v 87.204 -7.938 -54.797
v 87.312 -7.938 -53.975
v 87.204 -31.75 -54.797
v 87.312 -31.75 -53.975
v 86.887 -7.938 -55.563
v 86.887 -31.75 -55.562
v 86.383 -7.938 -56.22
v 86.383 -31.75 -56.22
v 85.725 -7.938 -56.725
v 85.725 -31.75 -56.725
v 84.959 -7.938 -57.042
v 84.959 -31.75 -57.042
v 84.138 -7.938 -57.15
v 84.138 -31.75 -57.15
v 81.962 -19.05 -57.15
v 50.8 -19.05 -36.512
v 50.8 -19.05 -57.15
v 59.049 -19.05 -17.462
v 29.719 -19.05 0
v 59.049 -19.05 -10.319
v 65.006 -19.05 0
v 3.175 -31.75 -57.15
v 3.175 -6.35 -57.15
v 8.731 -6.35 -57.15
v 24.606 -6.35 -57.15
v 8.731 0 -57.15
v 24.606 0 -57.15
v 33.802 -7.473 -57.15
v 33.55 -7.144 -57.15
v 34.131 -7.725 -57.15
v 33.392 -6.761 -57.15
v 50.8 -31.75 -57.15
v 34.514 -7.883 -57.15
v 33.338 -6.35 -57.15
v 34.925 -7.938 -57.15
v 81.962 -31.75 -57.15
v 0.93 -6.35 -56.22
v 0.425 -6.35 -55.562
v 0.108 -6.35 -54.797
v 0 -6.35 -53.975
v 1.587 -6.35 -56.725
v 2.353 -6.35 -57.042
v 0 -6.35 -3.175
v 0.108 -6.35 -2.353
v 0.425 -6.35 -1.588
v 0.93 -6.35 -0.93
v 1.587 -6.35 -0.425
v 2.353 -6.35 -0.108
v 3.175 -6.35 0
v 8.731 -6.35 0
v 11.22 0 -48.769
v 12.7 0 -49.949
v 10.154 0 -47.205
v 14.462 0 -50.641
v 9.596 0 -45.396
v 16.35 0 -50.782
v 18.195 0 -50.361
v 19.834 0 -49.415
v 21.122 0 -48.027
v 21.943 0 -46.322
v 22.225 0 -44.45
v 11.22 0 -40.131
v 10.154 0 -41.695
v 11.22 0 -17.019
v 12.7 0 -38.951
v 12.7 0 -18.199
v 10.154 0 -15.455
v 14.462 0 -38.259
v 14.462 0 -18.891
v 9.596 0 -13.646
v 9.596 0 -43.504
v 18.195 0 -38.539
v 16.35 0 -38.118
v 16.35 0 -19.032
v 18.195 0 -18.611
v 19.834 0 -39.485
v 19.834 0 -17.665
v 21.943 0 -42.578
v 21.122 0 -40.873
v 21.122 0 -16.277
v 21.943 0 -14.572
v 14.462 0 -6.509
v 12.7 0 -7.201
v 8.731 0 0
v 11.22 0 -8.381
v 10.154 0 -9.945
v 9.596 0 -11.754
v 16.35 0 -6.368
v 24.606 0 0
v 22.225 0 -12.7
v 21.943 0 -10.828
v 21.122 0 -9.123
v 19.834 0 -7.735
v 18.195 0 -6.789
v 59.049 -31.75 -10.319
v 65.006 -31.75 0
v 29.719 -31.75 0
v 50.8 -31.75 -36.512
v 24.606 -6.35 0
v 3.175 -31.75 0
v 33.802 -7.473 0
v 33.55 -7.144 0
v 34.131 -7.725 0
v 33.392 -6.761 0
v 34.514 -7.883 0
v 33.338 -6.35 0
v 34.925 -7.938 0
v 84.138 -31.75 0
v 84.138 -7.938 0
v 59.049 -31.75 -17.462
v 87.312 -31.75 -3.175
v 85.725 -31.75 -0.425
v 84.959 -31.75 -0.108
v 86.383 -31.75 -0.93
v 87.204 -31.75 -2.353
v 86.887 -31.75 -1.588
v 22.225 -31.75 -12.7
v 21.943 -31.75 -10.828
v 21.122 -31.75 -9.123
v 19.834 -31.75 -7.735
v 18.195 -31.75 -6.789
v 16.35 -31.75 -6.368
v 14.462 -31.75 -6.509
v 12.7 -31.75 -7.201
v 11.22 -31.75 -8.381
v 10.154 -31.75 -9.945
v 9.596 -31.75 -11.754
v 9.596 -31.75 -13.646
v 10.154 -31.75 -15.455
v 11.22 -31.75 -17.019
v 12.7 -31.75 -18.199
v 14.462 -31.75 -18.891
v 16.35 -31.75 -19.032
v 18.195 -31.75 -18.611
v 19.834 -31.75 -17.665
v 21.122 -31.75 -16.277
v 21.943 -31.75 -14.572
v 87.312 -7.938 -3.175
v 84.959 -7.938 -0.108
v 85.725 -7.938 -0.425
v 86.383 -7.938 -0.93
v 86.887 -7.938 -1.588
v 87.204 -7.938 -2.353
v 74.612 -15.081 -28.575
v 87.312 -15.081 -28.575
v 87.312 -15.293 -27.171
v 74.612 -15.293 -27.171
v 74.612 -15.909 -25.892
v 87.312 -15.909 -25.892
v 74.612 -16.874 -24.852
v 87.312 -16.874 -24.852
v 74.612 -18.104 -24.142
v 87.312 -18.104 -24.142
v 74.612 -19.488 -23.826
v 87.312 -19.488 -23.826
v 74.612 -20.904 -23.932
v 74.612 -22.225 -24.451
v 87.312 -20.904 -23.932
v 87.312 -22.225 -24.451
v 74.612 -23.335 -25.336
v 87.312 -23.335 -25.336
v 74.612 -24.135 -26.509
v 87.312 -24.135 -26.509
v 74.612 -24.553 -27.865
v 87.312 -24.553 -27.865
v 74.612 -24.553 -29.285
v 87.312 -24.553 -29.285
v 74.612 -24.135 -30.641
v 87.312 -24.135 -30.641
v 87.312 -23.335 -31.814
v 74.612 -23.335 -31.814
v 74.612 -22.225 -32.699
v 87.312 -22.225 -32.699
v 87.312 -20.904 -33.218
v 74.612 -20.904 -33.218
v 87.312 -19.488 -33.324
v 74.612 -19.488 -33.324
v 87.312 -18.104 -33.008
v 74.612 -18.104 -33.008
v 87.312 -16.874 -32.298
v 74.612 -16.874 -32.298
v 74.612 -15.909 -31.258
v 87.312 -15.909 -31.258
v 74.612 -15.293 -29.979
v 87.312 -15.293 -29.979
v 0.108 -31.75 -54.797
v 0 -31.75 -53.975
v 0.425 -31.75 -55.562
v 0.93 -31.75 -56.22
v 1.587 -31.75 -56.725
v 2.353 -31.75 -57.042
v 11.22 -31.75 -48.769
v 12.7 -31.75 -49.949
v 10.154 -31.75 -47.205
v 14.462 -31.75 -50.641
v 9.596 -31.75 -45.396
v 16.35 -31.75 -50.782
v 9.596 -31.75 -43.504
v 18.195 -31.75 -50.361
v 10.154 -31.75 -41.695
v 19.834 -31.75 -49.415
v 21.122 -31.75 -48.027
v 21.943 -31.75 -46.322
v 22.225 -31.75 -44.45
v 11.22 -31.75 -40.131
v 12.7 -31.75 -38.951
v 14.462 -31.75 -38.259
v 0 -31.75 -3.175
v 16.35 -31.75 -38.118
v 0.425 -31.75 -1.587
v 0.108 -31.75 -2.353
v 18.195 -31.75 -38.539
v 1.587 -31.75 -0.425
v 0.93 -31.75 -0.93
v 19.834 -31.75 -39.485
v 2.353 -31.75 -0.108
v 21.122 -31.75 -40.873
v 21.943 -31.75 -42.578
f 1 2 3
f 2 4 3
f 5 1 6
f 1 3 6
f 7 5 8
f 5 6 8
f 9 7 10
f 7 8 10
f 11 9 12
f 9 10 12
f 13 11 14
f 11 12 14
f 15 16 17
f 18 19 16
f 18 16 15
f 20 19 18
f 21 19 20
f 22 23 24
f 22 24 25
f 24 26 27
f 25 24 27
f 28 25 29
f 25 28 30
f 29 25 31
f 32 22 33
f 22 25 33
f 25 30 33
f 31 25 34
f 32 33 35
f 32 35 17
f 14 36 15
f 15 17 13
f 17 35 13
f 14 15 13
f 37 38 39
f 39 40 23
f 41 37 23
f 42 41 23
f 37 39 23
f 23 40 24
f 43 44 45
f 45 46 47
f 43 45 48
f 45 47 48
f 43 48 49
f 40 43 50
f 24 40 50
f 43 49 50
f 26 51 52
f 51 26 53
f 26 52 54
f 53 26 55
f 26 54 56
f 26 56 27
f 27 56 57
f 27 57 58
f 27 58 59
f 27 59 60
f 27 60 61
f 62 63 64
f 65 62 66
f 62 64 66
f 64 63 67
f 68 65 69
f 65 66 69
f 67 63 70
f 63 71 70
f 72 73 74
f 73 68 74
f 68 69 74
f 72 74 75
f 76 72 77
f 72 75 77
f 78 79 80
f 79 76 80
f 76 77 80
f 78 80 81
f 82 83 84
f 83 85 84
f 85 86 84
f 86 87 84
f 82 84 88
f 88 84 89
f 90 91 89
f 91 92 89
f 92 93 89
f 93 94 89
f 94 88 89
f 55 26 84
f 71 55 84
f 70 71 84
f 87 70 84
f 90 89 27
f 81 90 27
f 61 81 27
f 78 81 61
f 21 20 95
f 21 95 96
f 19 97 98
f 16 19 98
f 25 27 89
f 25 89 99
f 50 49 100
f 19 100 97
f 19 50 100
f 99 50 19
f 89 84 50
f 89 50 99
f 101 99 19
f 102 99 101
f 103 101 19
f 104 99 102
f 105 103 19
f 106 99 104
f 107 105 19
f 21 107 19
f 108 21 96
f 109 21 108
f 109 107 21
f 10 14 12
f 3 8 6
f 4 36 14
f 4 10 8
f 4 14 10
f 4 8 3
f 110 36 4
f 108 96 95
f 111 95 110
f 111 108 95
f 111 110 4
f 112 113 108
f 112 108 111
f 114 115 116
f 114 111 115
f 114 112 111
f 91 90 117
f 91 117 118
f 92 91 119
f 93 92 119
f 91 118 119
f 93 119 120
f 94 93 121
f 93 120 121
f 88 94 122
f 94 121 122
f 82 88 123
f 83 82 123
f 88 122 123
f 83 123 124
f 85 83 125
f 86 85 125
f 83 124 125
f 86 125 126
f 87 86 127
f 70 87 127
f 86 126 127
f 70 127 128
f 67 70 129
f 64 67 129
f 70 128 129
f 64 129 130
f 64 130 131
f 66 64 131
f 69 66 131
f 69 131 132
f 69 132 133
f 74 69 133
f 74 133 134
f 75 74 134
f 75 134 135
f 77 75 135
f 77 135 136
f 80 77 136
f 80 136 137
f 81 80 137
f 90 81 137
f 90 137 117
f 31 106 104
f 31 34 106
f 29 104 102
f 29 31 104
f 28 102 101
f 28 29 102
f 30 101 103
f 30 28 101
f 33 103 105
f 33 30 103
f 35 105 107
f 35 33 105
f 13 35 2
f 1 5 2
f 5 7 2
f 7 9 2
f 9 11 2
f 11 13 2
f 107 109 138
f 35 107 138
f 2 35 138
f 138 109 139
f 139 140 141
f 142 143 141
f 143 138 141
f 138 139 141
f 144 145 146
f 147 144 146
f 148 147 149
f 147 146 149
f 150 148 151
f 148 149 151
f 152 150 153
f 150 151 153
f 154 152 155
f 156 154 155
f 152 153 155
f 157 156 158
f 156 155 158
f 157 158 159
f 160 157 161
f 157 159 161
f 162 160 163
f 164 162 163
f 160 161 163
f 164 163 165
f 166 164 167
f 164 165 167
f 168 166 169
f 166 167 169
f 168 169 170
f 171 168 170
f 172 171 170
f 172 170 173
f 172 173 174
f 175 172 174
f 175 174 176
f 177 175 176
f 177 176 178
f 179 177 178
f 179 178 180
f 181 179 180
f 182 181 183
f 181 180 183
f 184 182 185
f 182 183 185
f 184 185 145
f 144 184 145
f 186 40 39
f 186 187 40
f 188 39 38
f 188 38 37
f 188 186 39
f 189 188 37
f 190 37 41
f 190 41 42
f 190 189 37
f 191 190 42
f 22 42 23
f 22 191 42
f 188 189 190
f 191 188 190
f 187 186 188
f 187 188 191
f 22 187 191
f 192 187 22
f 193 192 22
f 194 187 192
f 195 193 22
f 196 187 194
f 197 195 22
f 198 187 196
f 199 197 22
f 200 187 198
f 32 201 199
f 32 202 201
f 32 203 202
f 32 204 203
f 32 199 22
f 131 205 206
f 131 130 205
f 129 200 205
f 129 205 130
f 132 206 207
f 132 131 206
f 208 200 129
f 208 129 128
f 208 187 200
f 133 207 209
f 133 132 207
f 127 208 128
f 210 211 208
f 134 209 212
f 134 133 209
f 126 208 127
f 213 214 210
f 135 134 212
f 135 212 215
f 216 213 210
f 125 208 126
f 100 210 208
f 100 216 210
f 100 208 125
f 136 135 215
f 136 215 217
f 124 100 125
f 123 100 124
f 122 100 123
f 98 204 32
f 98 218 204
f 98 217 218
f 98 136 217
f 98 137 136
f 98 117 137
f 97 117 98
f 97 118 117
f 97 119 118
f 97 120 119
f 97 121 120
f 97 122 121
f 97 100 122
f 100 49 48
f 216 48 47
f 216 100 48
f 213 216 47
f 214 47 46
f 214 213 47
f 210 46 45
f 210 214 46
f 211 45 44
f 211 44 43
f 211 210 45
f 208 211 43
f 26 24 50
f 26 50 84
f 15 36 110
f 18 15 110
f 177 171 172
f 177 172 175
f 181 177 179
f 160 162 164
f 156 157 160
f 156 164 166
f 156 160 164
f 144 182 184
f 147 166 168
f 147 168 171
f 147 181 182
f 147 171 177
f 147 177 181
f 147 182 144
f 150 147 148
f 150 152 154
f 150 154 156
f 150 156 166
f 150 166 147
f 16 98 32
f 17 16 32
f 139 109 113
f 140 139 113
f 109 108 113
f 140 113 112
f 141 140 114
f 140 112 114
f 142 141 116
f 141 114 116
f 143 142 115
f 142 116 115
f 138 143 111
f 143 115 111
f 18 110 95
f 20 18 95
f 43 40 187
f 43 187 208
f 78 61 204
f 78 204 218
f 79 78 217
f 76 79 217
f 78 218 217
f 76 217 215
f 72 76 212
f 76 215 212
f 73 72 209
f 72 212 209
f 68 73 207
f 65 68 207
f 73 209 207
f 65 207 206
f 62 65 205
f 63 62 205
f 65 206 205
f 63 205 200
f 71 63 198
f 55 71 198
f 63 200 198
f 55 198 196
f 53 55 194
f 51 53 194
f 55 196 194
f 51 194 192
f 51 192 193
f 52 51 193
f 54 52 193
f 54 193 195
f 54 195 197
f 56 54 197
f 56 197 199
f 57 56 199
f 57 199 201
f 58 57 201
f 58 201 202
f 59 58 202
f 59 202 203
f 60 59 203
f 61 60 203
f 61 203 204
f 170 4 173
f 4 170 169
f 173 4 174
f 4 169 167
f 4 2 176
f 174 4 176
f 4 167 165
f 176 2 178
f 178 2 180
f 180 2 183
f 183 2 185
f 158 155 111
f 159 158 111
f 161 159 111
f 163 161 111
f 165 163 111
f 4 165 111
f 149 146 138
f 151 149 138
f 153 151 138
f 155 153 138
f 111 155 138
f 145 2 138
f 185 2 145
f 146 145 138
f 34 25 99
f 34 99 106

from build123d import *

# Parameters (mm, degrees)
F0_W      = 87.3125
F0_H      = 57.15
F1_DEPTH  = 31.75
F3_DEPTH  = 12.7
F4_W      = 8.73125
F4_H      = 6.35
F5_DEPTH  = 66.294
F6_R      = 1.58749
F7_R      = 3.175
F8_R      = 6.35
F9_DEPTH  = 108.204
F10_R     = 4.7625
F11_DEPTH = 12.7


# Not quite as in the source:
# - a fillet or chamfer is up to 0.001 mm smaller than in the source, because OpenCascade refuses the exact size


with BuildPart() as f1:
    # F0 (on Front) → F1 (new body)
    with BuildSketch(Plane.XZ):
        with Locations((43.65625, -28.575)):
            Rectangle(F0_W, F0_H)
    extrude(amount=F1_DEPTH)

    # F2 (on face) → F3 (cut)
    with BuildSketch(Plane.XZ.offset(31.75)):
        Polygon((50.8, -36.5125), (50.8, -57.15), (81.9624807795, -57.15), (59.048891971, -17.4625), (59.048891971, -10.31875), (65.0064250612, 0), (29.7194982962, 0), align=None)
    extrude(amount=-F3_DEPTH, mode=Mode.SUBTRACT)

    # F4 (on face) → F5 (cut)
    with BuildSketch(Plane.XY):
        Polygon((87.3125, 0), (24.60625, 0), (24.60625, -6.35), (33.3375, -6.35), (33.3375, -7.9375), (87.3125, -7.9375), align=None)
        with Locations((4.365625, -3.175)):
            Rectangle(F4_W, F4_H)
    extrude(amount=-F5_DEPTH, mode=Mode.SUBTRACT)

    # F6 (radius 1.5875 in the source; OpenCascade refuses exactly that, so slightly less here)
    f6_edges = [f1.edges().sort_by_distance(p)[0] for p in [
        (33.3375, -7.9375, -28.575),
    ]]
    fillet(f6_edges, radius=F6_R)

    # F7
    f7_edges = [f1.edges().sort_by_distance(p)[0] for p in [
        (87.3125, -19.84375, 0),
        (0, -19.05, 0),
        (87.3125, -19.84375, -57.15),
        (0, -19.05, -57.15),
    ]]
    fillet(f7_edges, radius=F7_R)

    # F8 (on face) → F9 (cut)
    with BuildSketch(Plane.XZ.offset(31.75)):
        with Locations((15.875, -12.7)):
            Circle(F8_R)
        with Locations((15.875, -44.45)):
            Circle(F8_R)
    extrude(amount=-F9_DEPTH, mode=Mode.SUBTRACT)

    # F10 (on face) → F11 (cut)
    with BuildSketch(Plane.YZ.offset(87.3125)):
        with Locations((-19.84375, -28.575)):
            Circle(F10_R)
    extrude(amount=-F11_DEPTH, mode=Mode.SUBTRACT)


solid = f1.part
